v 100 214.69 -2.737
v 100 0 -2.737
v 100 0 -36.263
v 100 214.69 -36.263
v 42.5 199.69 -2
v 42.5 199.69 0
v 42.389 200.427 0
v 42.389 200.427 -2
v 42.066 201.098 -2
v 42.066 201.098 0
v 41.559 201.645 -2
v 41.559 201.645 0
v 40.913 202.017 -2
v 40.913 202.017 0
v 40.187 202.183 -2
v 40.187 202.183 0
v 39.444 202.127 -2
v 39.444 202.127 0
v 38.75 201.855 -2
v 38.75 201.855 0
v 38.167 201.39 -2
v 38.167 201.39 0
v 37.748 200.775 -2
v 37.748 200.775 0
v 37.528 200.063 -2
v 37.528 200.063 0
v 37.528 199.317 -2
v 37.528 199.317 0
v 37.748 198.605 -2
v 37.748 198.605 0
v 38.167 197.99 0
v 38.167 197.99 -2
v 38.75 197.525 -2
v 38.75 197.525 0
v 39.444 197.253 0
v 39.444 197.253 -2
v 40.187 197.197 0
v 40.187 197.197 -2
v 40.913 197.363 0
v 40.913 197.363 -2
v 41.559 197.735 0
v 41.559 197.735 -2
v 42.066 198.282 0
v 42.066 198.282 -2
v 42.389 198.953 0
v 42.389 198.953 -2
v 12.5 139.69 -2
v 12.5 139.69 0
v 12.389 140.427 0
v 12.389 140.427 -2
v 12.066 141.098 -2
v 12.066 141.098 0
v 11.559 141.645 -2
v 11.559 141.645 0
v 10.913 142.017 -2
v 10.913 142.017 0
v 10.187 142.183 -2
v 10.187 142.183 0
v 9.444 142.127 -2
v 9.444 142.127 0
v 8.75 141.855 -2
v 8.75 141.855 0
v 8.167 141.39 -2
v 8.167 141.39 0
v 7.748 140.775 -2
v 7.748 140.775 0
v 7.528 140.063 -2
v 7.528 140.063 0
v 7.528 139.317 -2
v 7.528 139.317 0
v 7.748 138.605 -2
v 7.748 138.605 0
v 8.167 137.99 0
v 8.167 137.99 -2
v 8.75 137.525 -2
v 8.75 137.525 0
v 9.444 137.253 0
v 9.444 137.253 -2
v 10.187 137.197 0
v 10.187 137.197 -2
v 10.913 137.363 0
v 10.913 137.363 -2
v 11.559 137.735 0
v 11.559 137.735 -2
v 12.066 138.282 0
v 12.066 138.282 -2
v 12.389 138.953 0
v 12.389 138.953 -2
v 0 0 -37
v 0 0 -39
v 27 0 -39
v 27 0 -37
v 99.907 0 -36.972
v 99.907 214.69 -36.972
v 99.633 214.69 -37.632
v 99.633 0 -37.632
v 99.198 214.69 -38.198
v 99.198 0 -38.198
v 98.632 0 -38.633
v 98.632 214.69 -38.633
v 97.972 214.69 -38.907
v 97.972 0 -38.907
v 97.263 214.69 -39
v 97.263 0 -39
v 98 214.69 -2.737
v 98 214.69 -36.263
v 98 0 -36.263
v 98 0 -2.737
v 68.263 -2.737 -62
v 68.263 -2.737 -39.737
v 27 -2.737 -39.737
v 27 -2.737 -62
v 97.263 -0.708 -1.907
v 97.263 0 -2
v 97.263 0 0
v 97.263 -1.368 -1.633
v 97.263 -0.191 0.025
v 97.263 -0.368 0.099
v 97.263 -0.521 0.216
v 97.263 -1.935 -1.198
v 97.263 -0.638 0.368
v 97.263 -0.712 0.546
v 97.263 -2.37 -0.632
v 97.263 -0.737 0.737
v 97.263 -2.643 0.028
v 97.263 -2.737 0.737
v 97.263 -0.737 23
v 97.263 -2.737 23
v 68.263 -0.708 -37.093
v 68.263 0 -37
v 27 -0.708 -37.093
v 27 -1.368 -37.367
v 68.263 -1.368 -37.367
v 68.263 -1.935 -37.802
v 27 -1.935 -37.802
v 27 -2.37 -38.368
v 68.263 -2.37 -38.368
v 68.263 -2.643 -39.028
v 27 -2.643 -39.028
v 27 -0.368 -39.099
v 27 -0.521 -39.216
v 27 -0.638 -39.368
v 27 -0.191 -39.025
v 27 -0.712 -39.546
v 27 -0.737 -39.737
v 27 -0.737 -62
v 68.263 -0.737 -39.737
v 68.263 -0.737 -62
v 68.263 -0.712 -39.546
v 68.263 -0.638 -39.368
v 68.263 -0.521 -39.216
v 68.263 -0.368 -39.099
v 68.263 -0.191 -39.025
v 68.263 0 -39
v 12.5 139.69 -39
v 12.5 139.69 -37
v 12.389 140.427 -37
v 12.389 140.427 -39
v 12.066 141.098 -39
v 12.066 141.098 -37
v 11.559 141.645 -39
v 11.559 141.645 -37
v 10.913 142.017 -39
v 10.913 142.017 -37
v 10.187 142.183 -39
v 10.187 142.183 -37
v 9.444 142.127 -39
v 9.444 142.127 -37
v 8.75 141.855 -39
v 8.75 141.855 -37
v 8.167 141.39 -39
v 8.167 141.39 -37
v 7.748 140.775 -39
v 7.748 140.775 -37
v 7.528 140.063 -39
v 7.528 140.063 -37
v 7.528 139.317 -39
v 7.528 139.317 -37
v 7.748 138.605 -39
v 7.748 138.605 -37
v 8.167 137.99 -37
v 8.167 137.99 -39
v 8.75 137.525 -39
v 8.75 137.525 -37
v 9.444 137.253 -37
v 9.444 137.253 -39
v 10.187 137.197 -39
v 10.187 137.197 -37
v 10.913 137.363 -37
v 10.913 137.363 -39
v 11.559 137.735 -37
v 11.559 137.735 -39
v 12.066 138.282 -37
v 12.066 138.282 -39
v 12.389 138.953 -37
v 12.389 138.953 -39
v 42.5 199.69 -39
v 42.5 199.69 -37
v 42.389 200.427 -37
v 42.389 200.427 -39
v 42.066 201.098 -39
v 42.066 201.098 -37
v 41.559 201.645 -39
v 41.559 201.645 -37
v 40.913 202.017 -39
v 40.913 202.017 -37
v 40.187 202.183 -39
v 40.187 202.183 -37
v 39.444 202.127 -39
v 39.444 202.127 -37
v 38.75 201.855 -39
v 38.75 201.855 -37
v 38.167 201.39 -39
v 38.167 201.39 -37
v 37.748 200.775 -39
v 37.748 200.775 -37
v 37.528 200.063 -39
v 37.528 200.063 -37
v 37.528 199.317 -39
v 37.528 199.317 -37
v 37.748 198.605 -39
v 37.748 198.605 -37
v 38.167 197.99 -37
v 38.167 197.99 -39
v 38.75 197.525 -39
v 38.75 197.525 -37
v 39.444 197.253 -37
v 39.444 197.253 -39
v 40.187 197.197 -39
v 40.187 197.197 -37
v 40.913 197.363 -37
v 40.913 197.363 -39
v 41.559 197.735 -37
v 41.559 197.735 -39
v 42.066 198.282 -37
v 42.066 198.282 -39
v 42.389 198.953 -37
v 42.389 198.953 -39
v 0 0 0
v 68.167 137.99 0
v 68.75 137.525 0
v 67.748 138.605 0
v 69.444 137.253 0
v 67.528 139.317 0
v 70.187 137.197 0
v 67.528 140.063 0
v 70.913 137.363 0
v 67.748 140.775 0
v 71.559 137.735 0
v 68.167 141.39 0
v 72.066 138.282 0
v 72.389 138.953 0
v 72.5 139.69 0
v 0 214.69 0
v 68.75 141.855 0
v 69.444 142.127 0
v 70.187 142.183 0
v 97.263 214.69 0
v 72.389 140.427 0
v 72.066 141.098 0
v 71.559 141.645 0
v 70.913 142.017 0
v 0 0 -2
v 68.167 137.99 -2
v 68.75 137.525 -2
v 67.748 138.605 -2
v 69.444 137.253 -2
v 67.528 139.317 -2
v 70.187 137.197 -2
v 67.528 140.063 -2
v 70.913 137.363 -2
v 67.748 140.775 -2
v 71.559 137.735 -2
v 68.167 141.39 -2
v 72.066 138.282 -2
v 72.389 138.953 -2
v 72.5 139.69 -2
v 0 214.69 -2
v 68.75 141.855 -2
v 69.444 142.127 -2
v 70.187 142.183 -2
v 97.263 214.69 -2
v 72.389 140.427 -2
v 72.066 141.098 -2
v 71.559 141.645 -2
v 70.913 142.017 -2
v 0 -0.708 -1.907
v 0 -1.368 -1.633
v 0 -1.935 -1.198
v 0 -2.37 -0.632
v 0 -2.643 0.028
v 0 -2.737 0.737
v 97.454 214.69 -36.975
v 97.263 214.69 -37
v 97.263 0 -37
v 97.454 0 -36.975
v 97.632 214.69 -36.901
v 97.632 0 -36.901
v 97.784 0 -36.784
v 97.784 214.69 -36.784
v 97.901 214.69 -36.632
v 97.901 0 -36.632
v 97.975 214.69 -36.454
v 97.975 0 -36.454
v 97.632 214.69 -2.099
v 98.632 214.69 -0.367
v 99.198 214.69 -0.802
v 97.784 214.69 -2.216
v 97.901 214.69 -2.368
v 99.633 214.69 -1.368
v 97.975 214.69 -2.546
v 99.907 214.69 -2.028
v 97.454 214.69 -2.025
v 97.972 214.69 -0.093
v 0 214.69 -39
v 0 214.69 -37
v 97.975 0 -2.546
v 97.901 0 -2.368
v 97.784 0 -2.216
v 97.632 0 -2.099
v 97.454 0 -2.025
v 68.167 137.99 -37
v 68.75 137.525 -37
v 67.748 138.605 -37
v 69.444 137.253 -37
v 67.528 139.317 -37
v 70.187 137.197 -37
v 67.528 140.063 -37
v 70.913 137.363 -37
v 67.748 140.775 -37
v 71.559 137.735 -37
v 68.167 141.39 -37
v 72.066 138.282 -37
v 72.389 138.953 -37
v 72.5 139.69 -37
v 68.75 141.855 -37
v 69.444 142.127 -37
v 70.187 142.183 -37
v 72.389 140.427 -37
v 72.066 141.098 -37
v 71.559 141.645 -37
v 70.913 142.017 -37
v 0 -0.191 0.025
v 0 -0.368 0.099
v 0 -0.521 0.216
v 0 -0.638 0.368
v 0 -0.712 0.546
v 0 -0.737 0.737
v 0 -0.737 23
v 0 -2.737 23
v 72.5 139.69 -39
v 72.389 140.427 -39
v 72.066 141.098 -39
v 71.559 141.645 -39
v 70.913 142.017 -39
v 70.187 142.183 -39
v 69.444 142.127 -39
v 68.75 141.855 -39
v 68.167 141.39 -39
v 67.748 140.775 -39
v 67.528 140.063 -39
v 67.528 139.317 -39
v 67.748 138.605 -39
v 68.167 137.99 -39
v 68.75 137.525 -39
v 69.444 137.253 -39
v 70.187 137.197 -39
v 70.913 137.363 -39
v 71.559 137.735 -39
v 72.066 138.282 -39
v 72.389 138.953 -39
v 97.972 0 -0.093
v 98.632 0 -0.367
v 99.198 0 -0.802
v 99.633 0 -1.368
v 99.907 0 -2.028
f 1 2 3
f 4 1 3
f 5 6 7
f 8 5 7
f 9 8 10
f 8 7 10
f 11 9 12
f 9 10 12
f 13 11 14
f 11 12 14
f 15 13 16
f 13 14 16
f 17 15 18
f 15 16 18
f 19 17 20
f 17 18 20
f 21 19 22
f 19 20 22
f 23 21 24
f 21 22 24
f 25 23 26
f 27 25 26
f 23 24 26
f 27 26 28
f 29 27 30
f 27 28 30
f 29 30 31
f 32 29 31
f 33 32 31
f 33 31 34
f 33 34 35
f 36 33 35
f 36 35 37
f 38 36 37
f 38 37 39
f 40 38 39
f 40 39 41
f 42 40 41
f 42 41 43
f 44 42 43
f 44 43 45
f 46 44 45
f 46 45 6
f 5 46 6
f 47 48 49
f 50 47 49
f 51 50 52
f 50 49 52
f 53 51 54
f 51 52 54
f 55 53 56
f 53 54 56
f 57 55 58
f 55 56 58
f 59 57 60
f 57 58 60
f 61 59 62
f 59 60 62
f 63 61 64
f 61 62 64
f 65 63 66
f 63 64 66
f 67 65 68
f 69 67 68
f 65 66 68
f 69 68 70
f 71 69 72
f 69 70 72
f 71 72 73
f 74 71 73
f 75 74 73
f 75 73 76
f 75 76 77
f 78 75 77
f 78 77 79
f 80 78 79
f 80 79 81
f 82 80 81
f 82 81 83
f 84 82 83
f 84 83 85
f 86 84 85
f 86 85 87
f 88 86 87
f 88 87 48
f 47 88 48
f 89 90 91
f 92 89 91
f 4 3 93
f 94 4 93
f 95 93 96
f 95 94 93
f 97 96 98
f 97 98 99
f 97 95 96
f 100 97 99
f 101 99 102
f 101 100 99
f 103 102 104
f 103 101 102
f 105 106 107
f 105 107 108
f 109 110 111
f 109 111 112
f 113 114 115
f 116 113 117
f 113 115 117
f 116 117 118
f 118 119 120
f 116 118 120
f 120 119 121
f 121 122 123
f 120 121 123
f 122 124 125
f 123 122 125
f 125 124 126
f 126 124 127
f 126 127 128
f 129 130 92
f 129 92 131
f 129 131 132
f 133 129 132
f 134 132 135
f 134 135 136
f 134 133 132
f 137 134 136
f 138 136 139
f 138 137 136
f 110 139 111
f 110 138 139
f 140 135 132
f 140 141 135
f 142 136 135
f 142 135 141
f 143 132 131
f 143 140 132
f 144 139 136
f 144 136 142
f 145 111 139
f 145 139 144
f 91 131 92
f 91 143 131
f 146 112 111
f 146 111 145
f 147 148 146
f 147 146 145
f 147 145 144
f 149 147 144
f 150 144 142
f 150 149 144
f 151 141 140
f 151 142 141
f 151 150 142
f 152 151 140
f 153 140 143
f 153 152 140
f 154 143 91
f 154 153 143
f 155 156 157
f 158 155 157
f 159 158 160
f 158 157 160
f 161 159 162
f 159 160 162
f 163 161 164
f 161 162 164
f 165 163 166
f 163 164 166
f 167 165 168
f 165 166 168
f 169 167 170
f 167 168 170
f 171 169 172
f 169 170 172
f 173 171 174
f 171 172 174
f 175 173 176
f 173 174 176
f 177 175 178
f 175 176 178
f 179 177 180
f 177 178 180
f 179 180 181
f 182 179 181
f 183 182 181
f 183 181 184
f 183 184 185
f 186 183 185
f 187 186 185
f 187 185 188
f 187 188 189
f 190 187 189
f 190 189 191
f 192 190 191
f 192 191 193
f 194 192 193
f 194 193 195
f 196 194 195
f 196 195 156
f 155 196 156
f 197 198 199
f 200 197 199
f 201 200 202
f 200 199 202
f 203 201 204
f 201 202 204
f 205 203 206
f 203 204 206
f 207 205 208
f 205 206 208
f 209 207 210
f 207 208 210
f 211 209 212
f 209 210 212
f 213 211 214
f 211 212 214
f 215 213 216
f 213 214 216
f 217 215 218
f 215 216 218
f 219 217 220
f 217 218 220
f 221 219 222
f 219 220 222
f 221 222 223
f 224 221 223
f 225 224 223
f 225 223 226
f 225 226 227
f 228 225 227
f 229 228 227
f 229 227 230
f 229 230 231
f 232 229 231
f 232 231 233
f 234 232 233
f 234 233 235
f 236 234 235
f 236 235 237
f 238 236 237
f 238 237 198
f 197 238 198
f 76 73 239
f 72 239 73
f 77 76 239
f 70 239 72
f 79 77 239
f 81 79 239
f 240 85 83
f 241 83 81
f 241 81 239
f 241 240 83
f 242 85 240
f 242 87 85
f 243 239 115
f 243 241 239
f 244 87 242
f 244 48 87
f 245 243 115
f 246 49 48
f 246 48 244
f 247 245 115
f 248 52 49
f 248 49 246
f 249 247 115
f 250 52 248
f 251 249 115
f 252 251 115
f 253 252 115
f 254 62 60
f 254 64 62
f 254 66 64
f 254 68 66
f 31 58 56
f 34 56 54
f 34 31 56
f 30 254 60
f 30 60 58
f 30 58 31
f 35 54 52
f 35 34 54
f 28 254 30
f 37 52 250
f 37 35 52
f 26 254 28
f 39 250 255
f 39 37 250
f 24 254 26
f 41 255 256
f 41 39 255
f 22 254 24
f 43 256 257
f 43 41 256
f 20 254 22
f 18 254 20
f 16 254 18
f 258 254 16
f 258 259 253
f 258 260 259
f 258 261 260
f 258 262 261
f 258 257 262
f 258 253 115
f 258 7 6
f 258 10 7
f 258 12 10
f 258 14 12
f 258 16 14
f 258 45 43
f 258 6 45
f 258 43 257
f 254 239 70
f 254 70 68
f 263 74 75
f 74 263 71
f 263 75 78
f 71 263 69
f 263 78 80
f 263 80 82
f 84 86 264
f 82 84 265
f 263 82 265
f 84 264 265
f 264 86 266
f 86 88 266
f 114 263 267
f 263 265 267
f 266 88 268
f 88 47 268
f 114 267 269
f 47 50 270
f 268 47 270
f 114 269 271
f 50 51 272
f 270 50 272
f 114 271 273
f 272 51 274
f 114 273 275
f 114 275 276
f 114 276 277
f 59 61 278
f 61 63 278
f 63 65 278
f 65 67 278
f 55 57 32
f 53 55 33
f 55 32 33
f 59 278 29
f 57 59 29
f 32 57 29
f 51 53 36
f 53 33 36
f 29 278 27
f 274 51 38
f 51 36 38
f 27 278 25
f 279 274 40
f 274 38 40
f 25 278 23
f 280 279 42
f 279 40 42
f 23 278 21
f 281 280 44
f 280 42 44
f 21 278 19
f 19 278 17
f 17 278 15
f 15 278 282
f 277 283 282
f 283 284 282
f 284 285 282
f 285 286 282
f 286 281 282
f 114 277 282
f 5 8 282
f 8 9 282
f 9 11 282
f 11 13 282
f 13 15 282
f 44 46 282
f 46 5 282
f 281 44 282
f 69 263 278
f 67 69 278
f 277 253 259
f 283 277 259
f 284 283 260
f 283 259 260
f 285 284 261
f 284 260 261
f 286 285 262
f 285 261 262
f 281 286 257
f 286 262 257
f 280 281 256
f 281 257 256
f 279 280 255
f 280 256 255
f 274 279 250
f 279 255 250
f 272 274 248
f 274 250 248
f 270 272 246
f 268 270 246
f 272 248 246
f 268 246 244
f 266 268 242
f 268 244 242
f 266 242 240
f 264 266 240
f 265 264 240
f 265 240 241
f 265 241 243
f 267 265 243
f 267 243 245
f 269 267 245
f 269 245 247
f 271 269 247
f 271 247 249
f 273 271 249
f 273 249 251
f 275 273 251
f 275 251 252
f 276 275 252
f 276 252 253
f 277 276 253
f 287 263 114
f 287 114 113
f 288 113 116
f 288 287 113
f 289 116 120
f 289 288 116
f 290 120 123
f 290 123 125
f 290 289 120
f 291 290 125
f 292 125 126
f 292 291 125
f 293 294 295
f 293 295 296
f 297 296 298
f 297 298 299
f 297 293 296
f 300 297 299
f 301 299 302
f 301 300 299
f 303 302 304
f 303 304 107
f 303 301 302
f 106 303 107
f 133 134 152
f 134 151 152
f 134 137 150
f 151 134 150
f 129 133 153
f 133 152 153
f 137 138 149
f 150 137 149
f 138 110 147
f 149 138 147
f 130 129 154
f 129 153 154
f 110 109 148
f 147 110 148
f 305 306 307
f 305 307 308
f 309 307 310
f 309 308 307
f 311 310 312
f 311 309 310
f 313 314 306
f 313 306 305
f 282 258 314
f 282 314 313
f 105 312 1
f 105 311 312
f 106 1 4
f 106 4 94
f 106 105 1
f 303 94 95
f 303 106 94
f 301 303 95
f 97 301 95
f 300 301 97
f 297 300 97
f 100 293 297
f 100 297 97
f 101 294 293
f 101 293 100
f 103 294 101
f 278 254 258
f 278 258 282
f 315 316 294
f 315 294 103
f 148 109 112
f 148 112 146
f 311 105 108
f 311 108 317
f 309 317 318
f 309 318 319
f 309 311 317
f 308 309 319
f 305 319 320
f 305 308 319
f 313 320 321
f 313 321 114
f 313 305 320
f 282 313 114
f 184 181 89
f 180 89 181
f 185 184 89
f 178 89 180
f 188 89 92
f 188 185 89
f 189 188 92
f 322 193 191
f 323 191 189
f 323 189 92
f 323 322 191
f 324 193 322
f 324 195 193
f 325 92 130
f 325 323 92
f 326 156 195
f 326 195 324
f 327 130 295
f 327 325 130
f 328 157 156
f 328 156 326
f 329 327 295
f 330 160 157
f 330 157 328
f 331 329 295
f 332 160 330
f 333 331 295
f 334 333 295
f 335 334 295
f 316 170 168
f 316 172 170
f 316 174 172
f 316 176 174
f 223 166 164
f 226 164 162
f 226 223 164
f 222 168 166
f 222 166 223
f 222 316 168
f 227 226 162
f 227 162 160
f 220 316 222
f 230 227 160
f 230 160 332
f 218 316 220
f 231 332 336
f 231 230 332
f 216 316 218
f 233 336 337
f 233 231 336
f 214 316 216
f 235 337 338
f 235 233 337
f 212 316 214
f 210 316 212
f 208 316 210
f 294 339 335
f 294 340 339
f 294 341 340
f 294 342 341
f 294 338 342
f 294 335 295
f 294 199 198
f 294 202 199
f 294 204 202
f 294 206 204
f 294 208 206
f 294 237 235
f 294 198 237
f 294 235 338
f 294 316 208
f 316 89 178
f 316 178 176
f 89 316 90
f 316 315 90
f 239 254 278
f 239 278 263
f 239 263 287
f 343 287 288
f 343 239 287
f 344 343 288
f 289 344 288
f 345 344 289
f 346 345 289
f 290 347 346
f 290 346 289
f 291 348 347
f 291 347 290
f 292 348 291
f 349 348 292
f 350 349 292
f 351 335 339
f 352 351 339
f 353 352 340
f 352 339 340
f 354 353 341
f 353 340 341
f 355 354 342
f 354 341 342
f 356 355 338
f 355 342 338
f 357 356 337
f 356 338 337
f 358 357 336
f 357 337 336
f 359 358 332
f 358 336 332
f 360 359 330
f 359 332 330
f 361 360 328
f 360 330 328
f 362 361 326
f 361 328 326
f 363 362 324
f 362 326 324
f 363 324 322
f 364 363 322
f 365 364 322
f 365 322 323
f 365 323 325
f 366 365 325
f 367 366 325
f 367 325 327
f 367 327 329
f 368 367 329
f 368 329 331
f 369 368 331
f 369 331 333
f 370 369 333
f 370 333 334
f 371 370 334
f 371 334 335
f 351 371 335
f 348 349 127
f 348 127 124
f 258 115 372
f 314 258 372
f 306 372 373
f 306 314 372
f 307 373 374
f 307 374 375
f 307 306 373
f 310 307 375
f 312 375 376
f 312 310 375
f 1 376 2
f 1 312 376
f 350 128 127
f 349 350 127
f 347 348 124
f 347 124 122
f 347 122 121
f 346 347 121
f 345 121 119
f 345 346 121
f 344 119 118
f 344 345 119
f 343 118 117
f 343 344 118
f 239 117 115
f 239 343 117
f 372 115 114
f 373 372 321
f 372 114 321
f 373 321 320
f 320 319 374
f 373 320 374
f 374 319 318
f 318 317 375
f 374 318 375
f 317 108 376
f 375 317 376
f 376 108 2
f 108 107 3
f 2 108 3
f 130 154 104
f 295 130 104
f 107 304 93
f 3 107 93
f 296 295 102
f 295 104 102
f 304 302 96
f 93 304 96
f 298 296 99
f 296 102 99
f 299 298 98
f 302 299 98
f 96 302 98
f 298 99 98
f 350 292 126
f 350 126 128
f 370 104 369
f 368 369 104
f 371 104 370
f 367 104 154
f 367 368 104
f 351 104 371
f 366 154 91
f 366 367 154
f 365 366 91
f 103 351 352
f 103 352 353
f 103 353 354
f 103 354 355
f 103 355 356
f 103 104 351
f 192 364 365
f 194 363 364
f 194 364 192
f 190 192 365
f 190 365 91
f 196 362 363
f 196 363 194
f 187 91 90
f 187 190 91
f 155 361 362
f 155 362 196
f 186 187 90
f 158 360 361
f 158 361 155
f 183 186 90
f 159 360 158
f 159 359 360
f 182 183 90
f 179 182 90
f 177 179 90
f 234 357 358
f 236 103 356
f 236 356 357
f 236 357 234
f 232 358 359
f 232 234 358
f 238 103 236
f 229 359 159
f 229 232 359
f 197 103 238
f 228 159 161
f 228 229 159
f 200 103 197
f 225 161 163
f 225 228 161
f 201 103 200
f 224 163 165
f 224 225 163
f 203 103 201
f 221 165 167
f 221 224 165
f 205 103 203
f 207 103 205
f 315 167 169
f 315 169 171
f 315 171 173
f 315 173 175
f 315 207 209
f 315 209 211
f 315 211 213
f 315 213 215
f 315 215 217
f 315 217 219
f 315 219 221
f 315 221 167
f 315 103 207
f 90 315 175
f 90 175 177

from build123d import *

# Parameters (mm, degrees)
SKETCH1_W                    = 100
SKETCH1_H                    = 214.69
BASE_FLANGE1_DEPTH           = 2
EDGE_FLANGE1_STRIP_W         = 9.4732
EDGE_FLANGE1_STRIP_H         = 2
EDGE_FLANGE1_STRIP_CUT_DEPTH = 214.69
EDGE_FLANGE1_DEPTH           = 214.69
EDGE_FLANGE2_STRIP_W         = 9.4732
EDGE_FLANGE2_STRIP_H         = 2
EDGE_FLANGE2_STRIP_CUT_DEPTH = 214.69
EDGE_FLANGE2_DEPTH           = 214.69
EDGE_FLANGE3_DEPTH           = 97.2634
EDGE_FLANGE3_BEND_DEPTH      = 97.2634
SKETCH18_W                   = 29
SKETCH18_H                   = 2.7366
SKETCH18_W_2                 = 27
CUT_EXTRUDE1_DEPTH           = 25
CUT_EXTRUDE2_REACH           = 246.818
SKETCH19_R                   = 2.5


# Sheet-metal steps are written as plain solids
with BuildPart() as part:
    # Sketch1 → Base-Flange1 (new body)
    with BuildSketch(Plane.XY):
        with Locations((50, 107.345)):
            Rectangle(SKETCH1_W, SKETCH1_H)
    extrude(amount=-BASE_FLANGE1_DEPTH)

    # Edge-Flange1 strip (across the edge) → Edge-Flange1 strip cut (cut)
    with BuildSketch(Plane(origin=(100, 214.69, -2), x_dir=(-1, 0, 0), z_dir=(0, -1, 0))):
        with Locations((-2, -1)):
            Rectangle(EDGE_FLANGE1_STRIP_W, EDGE_FLANGE1_STRIP_H)
    extrude(amount=EDGE_FLANGE1_STRIP_CUT_DEPTH, mode=Mode.SUBTRACT)

    # Edge-Flange1 section (across the edge) → Edge-Flange1 (add)
    with BuildSketch(Plane(origin=(100, 214.69, -2), x_dir=(-1, 0, 0), z_dir=(0, -1, 0))):
        with BuildLine():
            Line((0, 0.7366), (0, 37))
            Line((0, 37), (2, 37))
            Line((2, 37), (2, 0.7366))
            ThreePointArc((2, 0.7366), (2.215745145, 0.215745145), (2.7366, 0))
            Line((2.7366, 0), (2.7366, -2))
            ThreePointArc((2.7366, -2), (0.801531583, -1.198468417), (0, 0.7366))
        make_face()
    extrude(amount=EDGE_FLANGE1_DEPTH)

    # Edge-Flange2 strip (across the edge) → Edge-Flange2 strip cut (cut)
    with BuildSketch(Plane(origin=(98, 214.69, -39), x_dir=(0, 0, 1), z_dir=(0, -1, 0))):
        with Locations((-2, -1)):
            Rectangle(EDGE_FLANGE2_STRIP_W, EDGE_FLANGE2_STRIP_H)
    extrude(amount=EDGE_FLANGE2_STRIP_CUT_DEPTH, mode=Mode.SUBTRACT)

    # Edge-Flange2 section (across the edge) → Edge-Flange2 (add)
    with BuildSketch(Plane(origin=(98, 214.69, -39), x_dir=(0, 0, 1), z_dir=(0, -1, 0))):
        with BuildLine():
            Line((0, 0.7366), (0, 98))
            Line((0, 98), (2, 98))
            Line((2, 98), (2, 0.7366))
            ThreePointArc((2, 0.7366), (2.215745145, 0.215745145), (2.7366, 0))
            Line((2.7366, 0), (2.7366, -2))
            ThreePointArc((2.7366, -2), (0.801531583, -1.198468417), (0, 0.7366))
        make_face()
    extrude(amount=EDGE_FLANGE2_DEPTH)

    # Edge-Flange3 section (across the edge) → Edge-Flange3 (add)
    with BuildSketch(Plane(origin=(0, -0.7366, 0), x_dir=(0, 1, 0), z_dir=(1, 0, 0))):
        with BuildLine():
            Line((-2, 0.7366), (-2, 23))
            Line((-2, 23), (0, 23))
            Line((0, 23), (0, 0.7366))
            ThreePointArc((0, 0.7366), (0.215745145, 0.215745145), (0.7366, 0))
            Line((0.7366, 0), (0.7366, -2))
            ThreePointArc((0.7366, -2), (-1.198468417, -1.198468417), (-2, 0.7366))
        make_face()
    extrude(amount=EDGE_FLANGE3_DEPTH)

    # Edge-Flange3 section 2 (across the edge) → Edge-Flange3 bend (add)
    with BuildSketch(Plane(origin=(97.2634, -0.7366, -39), x_dir=(0, 1, 0), z_dir=(-1, 0, 0))):
        with BuildLine():
            Line((-2, 0.7366), (-2, 23))
            Line((-2, 23), (0, 23))
            Line((0, 23), (0, 0.7366))
            ThreePointArc((0, 0.7366), (0.215745145, 0.215745145), (0.7366, 0))
            Line((0.7366, 0), (0.7366, -2))
            ThreePointArc((0.7366, -2), (-1.198468417, -1.198468417), (-2, 0.7366))
        make_face()
    extrude(amount=EDGE_FLANGE3_BEND_DEPTH)

    # Sketch18 → Cut-Extrude1 (cut)
    with BuildSketch(Plane(origin=(0, -57.7366, -62), x_dir=(1, 0, 0), z_dir=(0, 0, 1))):
        with Locations((82.7634, 56.3683)):
            Rectangle(SKETCH18_W, SKETCH18_H)
        with Locations((13.5, 56.3683)):
            Rectangle(SKETCH18_W_2, SKETCH18_H)
    extrude(amount=CUT_EXTRUDE1_DEPTH, mode=Mode.SUBTRACT)

    # Cut-Extrude2: up to this face of the body (flat: up to its plane)
    cut_extrude2_end = Plane(part.part.faces().sort_by_distance((48.6317, 107.345, -39))[0])
    # Sketch19 → Cut-Extrude2 (cut, up to the picked face)
    with BuildSketch(Plane.XY, mode=Mode.PRIVATE) as cut_extrude2_sk1:
        with Locations((40, 199.69)):
            Circle(SKETCH19_R)
    cut_extrude2_tool1 = split(extrude(cut_extrude2_sk1.sketch, amount=-CUT_EXTRUDE2_REACH, mode=Mode.PRIVATE), bisect_by=cut_extrude2_end, keep=Keep.BOTH, mode=Mode.PRIVATE)
    # Sketch19 → Cut-Extrude2 (cut, up to the picked face)
    with BuildSketch(Plane.XY, mode=Mode.PRIVATE) as cut_extrude2_sk2:
        with Locations((10, 139.69)):
            Circle(SKETCH19_R)
    cut_extrude2_tool2 = split(extrude(cut_extrude2_sk2.sketch, amount=-CUT_EXTRUDE2_REACH, mode=Mode.PRIVATE), bisect_by=cut_extrude2_end, keep=Keep.BOTH, mode=Mode.PRIVATE)
    # Sketch19 → Cut-Extrude2 (cut, up to the picked face)
    with BuildSketch(Plane.XY, mode=Mode.PRIVATE) as cut_extrude2_sk3:
        with Locations((70, 139.69)):
            Circle(SKETCH19_R)
    cut_extrude2_tool3 = split(extrude(cut_extrude2_sk3.sketch, amount=-CUT_EXTRUDE2_REACH, mode=Mode.PRIVATE), bisect_by=cut_extrude2_end, keep=Keep.BOTH, mode=Mode.PRIVATE)
    add(cut_extrude2_tool1.solids().sort_by(Axis((40, 199.69, 0), (0, 0, -1)))[0], mode=Mode.SUBTRACT)
    add(cut_extrude2_tool2.solids().sort_by(Axis((10, 139.69, 0), (0, 0, -1)))[0], mode=Mode.SUBTRACT)
    add(cut_extrude2_tool3.solids().sort_by(Axis((70, 139.69, 0), (0, 0, -1)))[0], mode=Mode.SUBTRACT)


solid = part.part
